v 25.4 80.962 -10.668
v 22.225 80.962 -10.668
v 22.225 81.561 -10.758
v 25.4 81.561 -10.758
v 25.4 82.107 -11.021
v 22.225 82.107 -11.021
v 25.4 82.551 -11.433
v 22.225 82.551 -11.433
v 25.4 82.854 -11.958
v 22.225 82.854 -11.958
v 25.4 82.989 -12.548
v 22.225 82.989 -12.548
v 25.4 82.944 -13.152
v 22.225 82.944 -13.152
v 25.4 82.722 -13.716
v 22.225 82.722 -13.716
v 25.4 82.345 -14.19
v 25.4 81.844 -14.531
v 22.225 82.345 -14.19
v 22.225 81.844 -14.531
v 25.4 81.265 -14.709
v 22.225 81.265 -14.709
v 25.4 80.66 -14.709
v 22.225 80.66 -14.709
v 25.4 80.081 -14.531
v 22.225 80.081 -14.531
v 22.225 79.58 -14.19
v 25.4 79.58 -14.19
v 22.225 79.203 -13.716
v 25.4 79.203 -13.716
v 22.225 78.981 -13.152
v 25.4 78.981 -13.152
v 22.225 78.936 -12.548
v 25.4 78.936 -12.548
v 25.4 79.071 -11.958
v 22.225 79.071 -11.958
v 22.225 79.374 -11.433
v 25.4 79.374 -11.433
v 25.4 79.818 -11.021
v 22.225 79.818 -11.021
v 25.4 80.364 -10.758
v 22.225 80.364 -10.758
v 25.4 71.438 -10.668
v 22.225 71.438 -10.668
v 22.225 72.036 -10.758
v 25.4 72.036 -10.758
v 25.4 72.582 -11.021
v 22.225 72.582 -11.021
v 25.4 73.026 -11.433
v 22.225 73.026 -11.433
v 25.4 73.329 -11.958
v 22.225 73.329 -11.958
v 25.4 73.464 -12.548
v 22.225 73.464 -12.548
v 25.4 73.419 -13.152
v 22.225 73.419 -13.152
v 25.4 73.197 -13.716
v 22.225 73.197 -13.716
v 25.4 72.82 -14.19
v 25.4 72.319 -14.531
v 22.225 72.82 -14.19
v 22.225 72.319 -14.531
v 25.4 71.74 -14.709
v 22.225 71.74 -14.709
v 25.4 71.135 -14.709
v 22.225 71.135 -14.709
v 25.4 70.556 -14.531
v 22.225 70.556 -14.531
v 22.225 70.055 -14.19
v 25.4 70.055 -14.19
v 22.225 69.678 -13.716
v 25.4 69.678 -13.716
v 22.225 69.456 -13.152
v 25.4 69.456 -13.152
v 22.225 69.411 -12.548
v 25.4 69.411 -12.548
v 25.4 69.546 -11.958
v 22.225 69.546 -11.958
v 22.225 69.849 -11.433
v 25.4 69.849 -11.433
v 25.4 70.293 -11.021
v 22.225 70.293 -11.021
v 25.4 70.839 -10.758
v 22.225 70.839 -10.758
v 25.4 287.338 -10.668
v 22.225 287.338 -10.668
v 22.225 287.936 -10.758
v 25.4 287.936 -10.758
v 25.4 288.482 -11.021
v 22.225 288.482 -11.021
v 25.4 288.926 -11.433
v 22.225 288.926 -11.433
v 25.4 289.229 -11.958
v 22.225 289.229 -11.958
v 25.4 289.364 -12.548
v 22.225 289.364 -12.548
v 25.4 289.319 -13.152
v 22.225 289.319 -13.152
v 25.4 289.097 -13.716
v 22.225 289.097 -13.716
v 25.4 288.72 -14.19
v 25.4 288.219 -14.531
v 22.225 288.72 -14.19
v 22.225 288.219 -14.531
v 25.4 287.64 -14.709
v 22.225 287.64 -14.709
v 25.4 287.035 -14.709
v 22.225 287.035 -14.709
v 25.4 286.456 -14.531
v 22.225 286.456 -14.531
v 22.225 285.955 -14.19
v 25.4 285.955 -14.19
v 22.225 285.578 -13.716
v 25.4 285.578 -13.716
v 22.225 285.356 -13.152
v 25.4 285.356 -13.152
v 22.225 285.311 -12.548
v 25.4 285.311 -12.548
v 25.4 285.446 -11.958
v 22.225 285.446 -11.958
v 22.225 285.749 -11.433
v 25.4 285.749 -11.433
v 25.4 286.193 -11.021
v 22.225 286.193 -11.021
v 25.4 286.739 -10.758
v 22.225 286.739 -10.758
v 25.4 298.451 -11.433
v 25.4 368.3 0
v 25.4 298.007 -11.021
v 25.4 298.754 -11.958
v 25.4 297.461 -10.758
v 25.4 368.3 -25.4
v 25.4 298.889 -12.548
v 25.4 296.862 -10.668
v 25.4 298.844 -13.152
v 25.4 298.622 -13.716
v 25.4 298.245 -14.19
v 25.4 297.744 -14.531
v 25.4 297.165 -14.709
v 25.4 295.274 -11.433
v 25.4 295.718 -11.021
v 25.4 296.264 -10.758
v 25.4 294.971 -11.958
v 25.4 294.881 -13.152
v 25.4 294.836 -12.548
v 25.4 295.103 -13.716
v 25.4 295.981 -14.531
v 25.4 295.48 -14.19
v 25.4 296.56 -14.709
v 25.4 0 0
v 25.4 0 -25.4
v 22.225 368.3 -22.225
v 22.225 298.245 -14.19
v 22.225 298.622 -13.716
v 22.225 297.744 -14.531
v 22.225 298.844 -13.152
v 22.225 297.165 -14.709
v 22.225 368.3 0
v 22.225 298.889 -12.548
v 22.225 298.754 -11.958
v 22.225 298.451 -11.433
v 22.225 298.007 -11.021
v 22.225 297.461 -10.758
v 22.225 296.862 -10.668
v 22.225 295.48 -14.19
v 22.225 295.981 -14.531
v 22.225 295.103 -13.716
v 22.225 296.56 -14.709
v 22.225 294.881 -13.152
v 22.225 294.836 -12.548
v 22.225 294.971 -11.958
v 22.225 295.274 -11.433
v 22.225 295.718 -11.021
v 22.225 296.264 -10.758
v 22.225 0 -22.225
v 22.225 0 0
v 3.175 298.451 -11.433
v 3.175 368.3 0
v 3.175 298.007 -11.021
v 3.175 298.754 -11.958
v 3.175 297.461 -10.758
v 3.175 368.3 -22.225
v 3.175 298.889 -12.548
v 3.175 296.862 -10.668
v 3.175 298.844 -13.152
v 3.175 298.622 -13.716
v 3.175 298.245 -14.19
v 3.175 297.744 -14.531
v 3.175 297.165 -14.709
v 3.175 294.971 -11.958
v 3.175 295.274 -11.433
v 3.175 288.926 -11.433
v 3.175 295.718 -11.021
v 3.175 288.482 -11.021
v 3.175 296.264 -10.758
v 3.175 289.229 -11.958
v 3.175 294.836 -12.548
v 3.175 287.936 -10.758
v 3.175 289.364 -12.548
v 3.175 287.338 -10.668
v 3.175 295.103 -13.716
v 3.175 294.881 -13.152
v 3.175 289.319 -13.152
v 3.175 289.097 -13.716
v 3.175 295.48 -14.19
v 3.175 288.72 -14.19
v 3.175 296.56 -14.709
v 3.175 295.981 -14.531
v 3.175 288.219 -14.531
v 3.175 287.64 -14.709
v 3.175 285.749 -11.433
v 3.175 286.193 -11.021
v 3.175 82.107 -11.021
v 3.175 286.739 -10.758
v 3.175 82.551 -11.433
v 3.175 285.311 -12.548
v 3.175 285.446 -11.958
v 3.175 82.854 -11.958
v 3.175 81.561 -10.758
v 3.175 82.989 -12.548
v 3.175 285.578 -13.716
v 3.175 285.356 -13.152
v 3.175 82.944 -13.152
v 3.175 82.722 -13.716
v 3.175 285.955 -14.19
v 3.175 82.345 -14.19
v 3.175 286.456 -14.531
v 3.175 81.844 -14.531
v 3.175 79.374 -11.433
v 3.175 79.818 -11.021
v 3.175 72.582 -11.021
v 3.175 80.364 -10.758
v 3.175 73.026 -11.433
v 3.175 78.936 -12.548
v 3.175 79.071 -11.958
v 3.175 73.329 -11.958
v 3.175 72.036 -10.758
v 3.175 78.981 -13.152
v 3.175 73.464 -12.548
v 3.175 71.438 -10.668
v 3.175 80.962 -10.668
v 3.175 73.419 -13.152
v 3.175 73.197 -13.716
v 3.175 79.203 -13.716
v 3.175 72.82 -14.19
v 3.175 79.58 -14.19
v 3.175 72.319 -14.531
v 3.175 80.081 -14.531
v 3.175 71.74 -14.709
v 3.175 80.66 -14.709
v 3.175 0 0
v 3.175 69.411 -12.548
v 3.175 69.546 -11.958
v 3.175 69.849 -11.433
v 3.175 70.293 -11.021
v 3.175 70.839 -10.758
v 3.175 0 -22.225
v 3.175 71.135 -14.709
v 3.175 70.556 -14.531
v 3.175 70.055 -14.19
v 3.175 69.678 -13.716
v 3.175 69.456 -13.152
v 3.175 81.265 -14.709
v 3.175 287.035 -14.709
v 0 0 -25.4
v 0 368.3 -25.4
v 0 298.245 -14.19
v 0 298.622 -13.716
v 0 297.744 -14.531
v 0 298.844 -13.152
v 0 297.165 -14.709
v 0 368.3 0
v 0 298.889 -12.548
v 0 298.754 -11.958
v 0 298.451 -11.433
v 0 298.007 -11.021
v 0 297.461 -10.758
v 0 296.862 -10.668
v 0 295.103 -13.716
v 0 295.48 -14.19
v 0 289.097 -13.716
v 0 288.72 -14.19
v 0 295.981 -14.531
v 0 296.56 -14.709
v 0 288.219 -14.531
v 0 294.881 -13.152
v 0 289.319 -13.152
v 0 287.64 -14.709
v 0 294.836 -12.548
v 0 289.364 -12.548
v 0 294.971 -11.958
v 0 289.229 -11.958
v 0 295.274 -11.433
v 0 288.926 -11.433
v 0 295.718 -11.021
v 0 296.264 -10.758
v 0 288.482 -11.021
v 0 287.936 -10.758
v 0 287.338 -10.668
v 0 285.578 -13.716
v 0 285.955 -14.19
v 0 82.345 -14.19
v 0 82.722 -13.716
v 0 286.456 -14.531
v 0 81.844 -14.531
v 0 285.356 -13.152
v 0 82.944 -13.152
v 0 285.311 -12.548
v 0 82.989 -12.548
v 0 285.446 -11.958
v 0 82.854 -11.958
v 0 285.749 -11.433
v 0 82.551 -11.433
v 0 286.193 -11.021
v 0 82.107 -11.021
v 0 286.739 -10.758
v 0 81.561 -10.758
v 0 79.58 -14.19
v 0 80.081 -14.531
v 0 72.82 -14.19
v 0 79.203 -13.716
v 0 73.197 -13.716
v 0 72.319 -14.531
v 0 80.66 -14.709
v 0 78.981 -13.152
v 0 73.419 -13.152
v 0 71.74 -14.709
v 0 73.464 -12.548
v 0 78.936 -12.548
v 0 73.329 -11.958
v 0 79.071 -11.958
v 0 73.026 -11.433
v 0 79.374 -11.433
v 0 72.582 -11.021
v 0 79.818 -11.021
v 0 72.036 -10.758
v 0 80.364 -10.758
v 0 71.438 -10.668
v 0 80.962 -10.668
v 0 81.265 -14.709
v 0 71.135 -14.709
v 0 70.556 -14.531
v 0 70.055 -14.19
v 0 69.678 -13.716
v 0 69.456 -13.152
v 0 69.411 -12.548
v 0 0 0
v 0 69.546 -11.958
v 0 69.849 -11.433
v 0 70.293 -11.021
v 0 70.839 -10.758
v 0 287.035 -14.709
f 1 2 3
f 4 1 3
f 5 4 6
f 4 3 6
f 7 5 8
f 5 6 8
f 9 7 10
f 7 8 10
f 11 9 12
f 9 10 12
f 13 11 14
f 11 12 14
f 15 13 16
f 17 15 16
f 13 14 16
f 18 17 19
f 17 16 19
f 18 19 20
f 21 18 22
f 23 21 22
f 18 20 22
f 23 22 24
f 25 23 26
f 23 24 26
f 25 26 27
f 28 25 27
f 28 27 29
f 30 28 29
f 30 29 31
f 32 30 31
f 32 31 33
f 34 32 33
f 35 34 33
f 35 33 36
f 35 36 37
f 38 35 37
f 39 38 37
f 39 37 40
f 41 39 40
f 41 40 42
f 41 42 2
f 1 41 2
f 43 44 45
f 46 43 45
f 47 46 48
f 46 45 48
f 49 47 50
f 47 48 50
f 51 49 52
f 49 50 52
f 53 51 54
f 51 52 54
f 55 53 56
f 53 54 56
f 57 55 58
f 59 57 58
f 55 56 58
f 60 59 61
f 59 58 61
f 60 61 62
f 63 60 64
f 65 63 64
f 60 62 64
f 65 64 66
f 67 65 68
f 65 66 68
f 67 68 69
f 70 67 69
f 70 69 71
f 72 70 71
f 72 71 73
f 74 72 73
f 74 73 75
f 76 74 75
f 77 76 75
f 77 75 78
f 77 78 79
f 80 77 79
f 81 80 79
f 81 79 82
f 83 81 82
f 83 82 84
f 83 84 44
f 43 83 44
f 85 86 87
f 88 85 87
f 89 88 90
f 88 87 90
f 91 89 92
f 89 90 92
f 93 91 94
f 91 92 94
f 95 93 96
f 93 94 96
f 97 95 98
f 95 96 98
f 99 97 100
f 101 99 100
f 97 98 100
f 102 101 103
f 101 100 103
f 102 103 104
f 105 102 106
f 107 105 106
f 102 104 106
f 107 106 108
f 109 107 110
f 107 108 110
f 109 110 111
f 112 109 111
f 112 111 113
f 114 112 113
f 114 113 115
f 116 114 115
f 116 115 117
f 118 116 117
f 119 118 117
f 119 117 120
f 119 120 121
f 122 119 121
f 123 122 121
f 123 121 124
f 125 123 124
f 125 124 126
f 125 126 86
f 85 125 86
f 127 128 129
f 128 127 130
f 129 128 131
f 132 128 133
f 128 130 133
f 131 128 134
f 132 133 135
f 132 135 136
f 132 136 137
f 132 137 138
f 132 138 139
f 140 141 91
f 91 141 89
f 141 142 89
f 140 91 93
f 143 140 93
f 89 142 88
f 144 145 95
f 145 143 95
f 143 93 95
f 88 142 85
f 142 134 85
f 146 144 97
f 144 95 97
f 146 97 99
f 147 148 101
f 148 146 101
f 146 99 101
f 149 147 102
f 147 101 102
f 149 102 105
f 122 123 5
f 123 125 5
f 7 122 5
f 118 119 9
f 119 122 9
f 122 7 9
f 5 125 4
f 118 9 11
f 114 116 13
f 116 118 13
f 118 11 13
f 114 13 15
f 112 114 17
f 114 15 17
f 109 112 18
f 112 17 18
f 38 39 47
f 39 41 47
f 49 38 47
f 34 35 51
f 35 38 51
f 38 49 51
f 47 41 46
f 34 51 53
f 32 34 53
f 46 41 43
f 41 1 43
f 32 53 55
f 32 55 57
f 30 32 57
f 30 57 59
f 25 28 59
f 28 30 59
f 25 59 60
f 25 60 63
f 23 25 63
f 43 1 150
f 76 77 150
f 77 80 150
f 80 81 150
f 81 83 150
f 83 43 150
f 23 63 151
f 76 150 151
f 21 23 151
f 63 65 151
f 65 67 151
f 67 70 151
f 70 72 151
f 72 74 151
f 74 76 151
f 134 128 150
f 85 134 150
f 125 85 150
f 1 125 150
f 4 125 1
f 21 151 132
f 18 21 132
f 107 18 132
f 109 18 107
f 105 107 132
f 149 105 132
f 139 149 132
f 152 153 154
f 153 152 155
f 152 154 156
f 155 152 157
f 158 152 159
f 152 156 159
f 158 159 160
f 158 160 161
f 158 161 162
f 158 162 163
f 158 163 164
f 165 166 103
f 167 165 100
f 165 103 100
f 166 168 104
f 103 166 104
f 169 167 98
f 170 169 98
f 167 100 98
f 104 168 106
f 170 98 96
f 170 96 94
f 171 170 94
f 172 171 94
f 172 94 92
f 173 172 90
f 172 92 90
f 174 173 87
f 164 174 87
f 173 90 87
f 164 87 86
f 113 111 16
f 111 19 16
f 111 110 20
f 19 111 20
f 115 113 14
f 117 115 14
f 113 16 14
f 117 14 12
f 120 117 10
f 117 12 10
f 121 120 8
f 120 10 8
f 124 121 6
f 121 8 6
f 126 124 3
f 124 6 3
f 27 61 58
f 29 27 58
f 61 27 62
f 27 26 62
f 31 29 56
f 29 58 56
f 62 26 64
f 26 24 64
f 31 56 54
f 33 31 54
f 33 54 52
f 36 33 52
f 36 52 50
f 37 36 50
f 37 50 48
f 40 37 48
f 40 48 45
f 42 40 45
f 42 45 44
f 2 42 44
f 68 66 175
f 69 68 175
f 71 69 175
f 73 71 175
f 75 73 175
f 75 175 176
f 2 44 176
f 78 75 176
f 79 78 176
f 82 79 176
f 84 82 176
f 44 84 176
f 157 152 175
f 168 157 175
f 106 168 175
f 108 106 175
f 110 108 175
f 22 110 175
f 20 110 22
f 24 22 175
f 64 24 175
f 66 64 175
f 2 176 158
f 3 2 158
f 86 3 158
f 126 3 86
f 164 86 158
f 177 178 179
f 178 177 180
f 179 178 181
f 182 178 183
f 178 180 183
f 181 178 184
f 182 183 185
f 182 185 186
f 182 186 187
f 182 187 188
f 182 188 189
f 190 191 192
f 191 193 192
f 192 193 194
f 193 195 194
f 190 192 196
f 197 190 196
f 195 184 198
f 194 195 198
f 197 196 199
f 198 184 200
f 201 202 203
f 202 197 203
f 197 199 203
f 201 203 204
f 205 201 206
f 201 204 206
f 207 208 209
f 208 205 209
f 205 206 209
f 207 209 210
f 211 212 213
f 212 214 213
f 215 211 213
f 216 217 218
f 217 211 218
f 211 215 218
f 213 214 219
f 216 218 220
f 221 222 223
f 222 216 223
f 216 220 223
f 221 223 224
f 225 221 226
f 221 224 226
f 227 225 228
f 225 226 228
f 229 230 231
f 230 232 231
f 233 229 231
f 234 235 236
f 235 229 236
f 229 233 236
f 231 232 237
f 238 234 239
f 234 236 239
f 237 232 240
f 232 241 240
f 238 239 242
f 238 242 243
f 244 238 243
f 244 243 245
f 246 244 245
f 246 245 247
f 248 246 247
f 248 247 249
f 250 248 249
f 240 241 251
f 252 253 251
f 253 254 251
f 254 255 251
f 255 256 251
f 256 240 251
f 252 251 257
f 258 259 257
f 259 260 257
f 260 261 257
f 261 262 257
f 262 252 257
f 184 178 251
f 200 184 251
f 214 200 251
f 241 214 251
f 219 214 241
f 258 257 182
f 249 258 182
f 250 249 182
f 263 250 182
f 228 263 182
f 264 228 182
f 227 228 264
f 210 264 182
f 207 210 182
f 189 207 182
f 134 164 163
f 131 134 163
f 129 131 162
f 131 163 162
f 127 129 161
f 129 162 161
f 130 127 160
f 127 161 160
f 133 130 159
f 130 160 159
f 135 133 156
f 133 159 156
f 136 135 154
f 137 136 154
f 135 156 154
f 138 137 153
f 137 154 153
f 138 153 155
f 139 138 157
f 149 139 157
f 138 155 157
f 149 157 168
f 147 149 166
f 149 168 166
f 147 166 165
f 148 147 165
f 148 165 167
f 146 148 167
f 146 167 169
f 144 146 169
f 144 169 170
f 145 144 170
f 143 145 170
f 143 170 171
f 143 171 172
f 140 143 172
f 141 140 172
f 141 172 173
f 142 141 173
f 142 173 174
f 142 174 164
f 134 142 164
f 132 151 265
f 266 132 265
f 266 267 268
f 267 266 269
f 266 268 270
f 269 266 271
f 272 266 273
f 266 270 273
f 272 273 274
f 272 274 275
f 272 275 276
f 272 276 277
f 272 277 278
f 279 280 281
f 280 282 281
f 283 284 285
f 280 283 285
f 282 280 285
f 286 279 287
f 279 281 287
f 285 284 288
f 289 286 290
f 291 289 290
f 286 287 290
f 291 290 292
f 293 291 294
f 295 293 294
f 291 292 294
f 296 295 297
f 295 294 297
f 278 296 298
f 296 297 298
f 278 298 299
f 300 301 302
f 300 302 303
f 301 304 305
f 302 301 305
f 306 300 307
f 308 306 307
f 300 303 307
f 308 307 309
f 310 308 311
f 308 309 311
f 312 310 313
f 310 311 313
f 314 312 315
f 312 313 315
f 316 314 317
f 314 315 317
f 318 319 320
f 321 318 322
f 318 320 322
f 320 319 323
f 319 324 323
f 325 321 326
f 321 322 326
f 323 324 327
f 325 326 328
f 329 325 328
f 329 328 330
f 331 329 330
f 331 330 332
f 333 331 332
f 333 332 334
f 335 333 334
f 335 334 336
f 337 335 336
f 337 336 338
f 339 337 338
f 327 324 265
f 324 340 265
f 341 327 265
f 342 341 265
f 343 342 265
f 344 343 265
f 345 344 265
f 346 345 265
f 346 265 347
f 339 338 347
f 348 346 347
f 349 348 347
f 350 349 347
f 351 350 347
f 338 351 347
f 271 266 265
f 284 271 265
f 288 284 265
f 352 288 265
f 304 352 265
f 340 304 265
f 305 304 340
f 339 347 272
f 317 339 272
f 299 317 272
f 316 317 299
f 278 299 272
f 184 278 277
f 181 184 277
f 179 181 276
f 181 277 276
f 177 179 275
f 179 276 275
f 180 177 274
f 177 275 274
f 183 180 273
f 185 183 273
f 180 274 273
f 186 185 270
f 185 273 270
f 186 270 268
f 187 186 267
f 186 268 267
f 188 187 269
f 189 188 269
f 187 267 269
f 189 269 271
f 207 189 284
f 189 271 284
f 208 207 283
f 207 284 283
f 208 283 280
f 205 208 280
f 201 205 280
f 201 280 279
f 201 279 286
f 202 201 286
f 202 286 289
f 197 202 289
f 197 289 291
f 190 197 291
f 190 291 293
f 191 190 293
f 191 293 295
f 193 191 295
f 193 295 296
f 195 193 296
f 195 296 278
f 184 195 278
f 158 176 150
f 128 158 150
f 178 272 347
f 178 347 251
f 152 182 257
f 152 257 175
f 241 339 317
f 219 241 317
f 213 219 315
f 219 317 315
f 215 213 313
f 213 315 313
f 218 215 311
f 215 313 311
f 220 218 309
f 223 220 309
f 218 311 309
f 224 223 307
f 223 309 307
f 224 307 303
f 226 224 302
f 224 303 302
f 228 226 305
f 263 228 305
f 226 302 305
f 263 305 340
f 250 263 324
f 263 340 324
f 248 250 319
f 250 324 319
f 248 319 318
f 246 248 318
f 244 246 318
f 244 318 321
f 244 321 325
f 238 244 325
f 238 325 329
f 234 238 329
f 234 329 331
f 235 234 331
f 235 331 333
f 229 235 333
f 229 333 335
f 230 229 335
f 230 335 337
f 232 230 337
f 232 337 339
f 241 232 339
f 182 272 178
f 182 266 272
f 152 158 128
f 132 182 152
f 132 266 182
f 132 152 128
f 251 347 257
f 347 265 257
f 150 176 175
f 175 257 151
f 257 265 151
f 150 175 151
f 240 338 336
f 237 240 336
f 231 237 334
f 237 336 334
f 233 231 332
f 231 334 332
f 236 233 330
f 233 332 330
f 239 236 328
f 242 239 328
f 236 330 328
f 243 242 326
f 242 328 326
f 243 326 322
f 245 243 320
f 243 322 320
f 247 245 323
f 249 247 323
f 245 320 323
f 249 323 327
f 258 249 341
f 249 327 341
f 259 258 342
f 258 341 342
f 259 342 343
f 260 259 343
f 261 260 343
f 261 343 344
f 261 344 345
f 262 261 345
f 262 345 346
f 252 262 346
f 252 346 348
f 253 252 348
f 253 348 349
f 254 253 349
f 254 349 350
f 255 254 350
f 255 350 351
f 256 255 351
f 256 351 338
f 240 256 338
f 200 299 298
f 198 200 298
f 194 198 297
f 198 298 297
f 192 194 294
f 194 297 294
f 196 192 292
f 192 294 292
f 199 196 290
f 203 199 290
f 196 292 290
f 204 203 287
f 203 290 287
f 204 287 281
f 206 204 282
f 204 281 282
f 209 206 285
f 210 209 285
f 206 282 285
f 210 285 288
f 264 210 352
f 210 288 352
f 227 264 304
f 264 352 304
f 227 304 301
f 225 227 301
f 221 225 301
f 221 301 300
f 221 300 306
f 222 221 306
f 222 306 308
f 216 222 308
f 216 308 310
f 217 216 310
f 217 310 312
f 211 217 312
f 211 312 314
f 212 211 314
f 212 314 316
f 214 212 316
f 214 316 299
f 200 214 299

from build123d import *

# Parameters (mm, degrees)
BOSS_EXTRUDE1_DEPTH = 368.3
SKETCH2_R           = 2.032
CUT_EXTRUDE1_DEPTH  = 25.4


with BuildPart() as part:
    # Sketch1 → Boss-Extrude1 (new body)
    with BuildSketch(Plane(origin=(0, 0, 0), x_dir=(1, 0, 0), z_dir=(0, 1, 0))):
        Polygon((0, 0), (3.175, 0), (3.175, 22.225), (22.225, 22.225), (22.225, 0), (25.4, 0), (25.4, 25.4), (0, 25.4), align=None)
    extrude(amount=BOSS_EXTRUDE1_DEPTH)

    # Sketch2 → Cut-Extrude1 (cut)
    with BuildSketch(Plane.ZY):
        with Locations((-12.7, 71.4375)):
            Circle(SKETCH2_R)
        with Locations((-12.7, 296.8625)):
            Circle(SKETCH2_R)
        with Locations((-12.7, 287.3375)):
            Circle(SKETCH2_R)
        with Locations((-12.7, 80.9625)):
            Circle(SKETCH2_R)
    extrude(amount=-CUT_EXTRUDE1_DEPTH, mode=Mode.SUBTRACT)


solid = part.part
